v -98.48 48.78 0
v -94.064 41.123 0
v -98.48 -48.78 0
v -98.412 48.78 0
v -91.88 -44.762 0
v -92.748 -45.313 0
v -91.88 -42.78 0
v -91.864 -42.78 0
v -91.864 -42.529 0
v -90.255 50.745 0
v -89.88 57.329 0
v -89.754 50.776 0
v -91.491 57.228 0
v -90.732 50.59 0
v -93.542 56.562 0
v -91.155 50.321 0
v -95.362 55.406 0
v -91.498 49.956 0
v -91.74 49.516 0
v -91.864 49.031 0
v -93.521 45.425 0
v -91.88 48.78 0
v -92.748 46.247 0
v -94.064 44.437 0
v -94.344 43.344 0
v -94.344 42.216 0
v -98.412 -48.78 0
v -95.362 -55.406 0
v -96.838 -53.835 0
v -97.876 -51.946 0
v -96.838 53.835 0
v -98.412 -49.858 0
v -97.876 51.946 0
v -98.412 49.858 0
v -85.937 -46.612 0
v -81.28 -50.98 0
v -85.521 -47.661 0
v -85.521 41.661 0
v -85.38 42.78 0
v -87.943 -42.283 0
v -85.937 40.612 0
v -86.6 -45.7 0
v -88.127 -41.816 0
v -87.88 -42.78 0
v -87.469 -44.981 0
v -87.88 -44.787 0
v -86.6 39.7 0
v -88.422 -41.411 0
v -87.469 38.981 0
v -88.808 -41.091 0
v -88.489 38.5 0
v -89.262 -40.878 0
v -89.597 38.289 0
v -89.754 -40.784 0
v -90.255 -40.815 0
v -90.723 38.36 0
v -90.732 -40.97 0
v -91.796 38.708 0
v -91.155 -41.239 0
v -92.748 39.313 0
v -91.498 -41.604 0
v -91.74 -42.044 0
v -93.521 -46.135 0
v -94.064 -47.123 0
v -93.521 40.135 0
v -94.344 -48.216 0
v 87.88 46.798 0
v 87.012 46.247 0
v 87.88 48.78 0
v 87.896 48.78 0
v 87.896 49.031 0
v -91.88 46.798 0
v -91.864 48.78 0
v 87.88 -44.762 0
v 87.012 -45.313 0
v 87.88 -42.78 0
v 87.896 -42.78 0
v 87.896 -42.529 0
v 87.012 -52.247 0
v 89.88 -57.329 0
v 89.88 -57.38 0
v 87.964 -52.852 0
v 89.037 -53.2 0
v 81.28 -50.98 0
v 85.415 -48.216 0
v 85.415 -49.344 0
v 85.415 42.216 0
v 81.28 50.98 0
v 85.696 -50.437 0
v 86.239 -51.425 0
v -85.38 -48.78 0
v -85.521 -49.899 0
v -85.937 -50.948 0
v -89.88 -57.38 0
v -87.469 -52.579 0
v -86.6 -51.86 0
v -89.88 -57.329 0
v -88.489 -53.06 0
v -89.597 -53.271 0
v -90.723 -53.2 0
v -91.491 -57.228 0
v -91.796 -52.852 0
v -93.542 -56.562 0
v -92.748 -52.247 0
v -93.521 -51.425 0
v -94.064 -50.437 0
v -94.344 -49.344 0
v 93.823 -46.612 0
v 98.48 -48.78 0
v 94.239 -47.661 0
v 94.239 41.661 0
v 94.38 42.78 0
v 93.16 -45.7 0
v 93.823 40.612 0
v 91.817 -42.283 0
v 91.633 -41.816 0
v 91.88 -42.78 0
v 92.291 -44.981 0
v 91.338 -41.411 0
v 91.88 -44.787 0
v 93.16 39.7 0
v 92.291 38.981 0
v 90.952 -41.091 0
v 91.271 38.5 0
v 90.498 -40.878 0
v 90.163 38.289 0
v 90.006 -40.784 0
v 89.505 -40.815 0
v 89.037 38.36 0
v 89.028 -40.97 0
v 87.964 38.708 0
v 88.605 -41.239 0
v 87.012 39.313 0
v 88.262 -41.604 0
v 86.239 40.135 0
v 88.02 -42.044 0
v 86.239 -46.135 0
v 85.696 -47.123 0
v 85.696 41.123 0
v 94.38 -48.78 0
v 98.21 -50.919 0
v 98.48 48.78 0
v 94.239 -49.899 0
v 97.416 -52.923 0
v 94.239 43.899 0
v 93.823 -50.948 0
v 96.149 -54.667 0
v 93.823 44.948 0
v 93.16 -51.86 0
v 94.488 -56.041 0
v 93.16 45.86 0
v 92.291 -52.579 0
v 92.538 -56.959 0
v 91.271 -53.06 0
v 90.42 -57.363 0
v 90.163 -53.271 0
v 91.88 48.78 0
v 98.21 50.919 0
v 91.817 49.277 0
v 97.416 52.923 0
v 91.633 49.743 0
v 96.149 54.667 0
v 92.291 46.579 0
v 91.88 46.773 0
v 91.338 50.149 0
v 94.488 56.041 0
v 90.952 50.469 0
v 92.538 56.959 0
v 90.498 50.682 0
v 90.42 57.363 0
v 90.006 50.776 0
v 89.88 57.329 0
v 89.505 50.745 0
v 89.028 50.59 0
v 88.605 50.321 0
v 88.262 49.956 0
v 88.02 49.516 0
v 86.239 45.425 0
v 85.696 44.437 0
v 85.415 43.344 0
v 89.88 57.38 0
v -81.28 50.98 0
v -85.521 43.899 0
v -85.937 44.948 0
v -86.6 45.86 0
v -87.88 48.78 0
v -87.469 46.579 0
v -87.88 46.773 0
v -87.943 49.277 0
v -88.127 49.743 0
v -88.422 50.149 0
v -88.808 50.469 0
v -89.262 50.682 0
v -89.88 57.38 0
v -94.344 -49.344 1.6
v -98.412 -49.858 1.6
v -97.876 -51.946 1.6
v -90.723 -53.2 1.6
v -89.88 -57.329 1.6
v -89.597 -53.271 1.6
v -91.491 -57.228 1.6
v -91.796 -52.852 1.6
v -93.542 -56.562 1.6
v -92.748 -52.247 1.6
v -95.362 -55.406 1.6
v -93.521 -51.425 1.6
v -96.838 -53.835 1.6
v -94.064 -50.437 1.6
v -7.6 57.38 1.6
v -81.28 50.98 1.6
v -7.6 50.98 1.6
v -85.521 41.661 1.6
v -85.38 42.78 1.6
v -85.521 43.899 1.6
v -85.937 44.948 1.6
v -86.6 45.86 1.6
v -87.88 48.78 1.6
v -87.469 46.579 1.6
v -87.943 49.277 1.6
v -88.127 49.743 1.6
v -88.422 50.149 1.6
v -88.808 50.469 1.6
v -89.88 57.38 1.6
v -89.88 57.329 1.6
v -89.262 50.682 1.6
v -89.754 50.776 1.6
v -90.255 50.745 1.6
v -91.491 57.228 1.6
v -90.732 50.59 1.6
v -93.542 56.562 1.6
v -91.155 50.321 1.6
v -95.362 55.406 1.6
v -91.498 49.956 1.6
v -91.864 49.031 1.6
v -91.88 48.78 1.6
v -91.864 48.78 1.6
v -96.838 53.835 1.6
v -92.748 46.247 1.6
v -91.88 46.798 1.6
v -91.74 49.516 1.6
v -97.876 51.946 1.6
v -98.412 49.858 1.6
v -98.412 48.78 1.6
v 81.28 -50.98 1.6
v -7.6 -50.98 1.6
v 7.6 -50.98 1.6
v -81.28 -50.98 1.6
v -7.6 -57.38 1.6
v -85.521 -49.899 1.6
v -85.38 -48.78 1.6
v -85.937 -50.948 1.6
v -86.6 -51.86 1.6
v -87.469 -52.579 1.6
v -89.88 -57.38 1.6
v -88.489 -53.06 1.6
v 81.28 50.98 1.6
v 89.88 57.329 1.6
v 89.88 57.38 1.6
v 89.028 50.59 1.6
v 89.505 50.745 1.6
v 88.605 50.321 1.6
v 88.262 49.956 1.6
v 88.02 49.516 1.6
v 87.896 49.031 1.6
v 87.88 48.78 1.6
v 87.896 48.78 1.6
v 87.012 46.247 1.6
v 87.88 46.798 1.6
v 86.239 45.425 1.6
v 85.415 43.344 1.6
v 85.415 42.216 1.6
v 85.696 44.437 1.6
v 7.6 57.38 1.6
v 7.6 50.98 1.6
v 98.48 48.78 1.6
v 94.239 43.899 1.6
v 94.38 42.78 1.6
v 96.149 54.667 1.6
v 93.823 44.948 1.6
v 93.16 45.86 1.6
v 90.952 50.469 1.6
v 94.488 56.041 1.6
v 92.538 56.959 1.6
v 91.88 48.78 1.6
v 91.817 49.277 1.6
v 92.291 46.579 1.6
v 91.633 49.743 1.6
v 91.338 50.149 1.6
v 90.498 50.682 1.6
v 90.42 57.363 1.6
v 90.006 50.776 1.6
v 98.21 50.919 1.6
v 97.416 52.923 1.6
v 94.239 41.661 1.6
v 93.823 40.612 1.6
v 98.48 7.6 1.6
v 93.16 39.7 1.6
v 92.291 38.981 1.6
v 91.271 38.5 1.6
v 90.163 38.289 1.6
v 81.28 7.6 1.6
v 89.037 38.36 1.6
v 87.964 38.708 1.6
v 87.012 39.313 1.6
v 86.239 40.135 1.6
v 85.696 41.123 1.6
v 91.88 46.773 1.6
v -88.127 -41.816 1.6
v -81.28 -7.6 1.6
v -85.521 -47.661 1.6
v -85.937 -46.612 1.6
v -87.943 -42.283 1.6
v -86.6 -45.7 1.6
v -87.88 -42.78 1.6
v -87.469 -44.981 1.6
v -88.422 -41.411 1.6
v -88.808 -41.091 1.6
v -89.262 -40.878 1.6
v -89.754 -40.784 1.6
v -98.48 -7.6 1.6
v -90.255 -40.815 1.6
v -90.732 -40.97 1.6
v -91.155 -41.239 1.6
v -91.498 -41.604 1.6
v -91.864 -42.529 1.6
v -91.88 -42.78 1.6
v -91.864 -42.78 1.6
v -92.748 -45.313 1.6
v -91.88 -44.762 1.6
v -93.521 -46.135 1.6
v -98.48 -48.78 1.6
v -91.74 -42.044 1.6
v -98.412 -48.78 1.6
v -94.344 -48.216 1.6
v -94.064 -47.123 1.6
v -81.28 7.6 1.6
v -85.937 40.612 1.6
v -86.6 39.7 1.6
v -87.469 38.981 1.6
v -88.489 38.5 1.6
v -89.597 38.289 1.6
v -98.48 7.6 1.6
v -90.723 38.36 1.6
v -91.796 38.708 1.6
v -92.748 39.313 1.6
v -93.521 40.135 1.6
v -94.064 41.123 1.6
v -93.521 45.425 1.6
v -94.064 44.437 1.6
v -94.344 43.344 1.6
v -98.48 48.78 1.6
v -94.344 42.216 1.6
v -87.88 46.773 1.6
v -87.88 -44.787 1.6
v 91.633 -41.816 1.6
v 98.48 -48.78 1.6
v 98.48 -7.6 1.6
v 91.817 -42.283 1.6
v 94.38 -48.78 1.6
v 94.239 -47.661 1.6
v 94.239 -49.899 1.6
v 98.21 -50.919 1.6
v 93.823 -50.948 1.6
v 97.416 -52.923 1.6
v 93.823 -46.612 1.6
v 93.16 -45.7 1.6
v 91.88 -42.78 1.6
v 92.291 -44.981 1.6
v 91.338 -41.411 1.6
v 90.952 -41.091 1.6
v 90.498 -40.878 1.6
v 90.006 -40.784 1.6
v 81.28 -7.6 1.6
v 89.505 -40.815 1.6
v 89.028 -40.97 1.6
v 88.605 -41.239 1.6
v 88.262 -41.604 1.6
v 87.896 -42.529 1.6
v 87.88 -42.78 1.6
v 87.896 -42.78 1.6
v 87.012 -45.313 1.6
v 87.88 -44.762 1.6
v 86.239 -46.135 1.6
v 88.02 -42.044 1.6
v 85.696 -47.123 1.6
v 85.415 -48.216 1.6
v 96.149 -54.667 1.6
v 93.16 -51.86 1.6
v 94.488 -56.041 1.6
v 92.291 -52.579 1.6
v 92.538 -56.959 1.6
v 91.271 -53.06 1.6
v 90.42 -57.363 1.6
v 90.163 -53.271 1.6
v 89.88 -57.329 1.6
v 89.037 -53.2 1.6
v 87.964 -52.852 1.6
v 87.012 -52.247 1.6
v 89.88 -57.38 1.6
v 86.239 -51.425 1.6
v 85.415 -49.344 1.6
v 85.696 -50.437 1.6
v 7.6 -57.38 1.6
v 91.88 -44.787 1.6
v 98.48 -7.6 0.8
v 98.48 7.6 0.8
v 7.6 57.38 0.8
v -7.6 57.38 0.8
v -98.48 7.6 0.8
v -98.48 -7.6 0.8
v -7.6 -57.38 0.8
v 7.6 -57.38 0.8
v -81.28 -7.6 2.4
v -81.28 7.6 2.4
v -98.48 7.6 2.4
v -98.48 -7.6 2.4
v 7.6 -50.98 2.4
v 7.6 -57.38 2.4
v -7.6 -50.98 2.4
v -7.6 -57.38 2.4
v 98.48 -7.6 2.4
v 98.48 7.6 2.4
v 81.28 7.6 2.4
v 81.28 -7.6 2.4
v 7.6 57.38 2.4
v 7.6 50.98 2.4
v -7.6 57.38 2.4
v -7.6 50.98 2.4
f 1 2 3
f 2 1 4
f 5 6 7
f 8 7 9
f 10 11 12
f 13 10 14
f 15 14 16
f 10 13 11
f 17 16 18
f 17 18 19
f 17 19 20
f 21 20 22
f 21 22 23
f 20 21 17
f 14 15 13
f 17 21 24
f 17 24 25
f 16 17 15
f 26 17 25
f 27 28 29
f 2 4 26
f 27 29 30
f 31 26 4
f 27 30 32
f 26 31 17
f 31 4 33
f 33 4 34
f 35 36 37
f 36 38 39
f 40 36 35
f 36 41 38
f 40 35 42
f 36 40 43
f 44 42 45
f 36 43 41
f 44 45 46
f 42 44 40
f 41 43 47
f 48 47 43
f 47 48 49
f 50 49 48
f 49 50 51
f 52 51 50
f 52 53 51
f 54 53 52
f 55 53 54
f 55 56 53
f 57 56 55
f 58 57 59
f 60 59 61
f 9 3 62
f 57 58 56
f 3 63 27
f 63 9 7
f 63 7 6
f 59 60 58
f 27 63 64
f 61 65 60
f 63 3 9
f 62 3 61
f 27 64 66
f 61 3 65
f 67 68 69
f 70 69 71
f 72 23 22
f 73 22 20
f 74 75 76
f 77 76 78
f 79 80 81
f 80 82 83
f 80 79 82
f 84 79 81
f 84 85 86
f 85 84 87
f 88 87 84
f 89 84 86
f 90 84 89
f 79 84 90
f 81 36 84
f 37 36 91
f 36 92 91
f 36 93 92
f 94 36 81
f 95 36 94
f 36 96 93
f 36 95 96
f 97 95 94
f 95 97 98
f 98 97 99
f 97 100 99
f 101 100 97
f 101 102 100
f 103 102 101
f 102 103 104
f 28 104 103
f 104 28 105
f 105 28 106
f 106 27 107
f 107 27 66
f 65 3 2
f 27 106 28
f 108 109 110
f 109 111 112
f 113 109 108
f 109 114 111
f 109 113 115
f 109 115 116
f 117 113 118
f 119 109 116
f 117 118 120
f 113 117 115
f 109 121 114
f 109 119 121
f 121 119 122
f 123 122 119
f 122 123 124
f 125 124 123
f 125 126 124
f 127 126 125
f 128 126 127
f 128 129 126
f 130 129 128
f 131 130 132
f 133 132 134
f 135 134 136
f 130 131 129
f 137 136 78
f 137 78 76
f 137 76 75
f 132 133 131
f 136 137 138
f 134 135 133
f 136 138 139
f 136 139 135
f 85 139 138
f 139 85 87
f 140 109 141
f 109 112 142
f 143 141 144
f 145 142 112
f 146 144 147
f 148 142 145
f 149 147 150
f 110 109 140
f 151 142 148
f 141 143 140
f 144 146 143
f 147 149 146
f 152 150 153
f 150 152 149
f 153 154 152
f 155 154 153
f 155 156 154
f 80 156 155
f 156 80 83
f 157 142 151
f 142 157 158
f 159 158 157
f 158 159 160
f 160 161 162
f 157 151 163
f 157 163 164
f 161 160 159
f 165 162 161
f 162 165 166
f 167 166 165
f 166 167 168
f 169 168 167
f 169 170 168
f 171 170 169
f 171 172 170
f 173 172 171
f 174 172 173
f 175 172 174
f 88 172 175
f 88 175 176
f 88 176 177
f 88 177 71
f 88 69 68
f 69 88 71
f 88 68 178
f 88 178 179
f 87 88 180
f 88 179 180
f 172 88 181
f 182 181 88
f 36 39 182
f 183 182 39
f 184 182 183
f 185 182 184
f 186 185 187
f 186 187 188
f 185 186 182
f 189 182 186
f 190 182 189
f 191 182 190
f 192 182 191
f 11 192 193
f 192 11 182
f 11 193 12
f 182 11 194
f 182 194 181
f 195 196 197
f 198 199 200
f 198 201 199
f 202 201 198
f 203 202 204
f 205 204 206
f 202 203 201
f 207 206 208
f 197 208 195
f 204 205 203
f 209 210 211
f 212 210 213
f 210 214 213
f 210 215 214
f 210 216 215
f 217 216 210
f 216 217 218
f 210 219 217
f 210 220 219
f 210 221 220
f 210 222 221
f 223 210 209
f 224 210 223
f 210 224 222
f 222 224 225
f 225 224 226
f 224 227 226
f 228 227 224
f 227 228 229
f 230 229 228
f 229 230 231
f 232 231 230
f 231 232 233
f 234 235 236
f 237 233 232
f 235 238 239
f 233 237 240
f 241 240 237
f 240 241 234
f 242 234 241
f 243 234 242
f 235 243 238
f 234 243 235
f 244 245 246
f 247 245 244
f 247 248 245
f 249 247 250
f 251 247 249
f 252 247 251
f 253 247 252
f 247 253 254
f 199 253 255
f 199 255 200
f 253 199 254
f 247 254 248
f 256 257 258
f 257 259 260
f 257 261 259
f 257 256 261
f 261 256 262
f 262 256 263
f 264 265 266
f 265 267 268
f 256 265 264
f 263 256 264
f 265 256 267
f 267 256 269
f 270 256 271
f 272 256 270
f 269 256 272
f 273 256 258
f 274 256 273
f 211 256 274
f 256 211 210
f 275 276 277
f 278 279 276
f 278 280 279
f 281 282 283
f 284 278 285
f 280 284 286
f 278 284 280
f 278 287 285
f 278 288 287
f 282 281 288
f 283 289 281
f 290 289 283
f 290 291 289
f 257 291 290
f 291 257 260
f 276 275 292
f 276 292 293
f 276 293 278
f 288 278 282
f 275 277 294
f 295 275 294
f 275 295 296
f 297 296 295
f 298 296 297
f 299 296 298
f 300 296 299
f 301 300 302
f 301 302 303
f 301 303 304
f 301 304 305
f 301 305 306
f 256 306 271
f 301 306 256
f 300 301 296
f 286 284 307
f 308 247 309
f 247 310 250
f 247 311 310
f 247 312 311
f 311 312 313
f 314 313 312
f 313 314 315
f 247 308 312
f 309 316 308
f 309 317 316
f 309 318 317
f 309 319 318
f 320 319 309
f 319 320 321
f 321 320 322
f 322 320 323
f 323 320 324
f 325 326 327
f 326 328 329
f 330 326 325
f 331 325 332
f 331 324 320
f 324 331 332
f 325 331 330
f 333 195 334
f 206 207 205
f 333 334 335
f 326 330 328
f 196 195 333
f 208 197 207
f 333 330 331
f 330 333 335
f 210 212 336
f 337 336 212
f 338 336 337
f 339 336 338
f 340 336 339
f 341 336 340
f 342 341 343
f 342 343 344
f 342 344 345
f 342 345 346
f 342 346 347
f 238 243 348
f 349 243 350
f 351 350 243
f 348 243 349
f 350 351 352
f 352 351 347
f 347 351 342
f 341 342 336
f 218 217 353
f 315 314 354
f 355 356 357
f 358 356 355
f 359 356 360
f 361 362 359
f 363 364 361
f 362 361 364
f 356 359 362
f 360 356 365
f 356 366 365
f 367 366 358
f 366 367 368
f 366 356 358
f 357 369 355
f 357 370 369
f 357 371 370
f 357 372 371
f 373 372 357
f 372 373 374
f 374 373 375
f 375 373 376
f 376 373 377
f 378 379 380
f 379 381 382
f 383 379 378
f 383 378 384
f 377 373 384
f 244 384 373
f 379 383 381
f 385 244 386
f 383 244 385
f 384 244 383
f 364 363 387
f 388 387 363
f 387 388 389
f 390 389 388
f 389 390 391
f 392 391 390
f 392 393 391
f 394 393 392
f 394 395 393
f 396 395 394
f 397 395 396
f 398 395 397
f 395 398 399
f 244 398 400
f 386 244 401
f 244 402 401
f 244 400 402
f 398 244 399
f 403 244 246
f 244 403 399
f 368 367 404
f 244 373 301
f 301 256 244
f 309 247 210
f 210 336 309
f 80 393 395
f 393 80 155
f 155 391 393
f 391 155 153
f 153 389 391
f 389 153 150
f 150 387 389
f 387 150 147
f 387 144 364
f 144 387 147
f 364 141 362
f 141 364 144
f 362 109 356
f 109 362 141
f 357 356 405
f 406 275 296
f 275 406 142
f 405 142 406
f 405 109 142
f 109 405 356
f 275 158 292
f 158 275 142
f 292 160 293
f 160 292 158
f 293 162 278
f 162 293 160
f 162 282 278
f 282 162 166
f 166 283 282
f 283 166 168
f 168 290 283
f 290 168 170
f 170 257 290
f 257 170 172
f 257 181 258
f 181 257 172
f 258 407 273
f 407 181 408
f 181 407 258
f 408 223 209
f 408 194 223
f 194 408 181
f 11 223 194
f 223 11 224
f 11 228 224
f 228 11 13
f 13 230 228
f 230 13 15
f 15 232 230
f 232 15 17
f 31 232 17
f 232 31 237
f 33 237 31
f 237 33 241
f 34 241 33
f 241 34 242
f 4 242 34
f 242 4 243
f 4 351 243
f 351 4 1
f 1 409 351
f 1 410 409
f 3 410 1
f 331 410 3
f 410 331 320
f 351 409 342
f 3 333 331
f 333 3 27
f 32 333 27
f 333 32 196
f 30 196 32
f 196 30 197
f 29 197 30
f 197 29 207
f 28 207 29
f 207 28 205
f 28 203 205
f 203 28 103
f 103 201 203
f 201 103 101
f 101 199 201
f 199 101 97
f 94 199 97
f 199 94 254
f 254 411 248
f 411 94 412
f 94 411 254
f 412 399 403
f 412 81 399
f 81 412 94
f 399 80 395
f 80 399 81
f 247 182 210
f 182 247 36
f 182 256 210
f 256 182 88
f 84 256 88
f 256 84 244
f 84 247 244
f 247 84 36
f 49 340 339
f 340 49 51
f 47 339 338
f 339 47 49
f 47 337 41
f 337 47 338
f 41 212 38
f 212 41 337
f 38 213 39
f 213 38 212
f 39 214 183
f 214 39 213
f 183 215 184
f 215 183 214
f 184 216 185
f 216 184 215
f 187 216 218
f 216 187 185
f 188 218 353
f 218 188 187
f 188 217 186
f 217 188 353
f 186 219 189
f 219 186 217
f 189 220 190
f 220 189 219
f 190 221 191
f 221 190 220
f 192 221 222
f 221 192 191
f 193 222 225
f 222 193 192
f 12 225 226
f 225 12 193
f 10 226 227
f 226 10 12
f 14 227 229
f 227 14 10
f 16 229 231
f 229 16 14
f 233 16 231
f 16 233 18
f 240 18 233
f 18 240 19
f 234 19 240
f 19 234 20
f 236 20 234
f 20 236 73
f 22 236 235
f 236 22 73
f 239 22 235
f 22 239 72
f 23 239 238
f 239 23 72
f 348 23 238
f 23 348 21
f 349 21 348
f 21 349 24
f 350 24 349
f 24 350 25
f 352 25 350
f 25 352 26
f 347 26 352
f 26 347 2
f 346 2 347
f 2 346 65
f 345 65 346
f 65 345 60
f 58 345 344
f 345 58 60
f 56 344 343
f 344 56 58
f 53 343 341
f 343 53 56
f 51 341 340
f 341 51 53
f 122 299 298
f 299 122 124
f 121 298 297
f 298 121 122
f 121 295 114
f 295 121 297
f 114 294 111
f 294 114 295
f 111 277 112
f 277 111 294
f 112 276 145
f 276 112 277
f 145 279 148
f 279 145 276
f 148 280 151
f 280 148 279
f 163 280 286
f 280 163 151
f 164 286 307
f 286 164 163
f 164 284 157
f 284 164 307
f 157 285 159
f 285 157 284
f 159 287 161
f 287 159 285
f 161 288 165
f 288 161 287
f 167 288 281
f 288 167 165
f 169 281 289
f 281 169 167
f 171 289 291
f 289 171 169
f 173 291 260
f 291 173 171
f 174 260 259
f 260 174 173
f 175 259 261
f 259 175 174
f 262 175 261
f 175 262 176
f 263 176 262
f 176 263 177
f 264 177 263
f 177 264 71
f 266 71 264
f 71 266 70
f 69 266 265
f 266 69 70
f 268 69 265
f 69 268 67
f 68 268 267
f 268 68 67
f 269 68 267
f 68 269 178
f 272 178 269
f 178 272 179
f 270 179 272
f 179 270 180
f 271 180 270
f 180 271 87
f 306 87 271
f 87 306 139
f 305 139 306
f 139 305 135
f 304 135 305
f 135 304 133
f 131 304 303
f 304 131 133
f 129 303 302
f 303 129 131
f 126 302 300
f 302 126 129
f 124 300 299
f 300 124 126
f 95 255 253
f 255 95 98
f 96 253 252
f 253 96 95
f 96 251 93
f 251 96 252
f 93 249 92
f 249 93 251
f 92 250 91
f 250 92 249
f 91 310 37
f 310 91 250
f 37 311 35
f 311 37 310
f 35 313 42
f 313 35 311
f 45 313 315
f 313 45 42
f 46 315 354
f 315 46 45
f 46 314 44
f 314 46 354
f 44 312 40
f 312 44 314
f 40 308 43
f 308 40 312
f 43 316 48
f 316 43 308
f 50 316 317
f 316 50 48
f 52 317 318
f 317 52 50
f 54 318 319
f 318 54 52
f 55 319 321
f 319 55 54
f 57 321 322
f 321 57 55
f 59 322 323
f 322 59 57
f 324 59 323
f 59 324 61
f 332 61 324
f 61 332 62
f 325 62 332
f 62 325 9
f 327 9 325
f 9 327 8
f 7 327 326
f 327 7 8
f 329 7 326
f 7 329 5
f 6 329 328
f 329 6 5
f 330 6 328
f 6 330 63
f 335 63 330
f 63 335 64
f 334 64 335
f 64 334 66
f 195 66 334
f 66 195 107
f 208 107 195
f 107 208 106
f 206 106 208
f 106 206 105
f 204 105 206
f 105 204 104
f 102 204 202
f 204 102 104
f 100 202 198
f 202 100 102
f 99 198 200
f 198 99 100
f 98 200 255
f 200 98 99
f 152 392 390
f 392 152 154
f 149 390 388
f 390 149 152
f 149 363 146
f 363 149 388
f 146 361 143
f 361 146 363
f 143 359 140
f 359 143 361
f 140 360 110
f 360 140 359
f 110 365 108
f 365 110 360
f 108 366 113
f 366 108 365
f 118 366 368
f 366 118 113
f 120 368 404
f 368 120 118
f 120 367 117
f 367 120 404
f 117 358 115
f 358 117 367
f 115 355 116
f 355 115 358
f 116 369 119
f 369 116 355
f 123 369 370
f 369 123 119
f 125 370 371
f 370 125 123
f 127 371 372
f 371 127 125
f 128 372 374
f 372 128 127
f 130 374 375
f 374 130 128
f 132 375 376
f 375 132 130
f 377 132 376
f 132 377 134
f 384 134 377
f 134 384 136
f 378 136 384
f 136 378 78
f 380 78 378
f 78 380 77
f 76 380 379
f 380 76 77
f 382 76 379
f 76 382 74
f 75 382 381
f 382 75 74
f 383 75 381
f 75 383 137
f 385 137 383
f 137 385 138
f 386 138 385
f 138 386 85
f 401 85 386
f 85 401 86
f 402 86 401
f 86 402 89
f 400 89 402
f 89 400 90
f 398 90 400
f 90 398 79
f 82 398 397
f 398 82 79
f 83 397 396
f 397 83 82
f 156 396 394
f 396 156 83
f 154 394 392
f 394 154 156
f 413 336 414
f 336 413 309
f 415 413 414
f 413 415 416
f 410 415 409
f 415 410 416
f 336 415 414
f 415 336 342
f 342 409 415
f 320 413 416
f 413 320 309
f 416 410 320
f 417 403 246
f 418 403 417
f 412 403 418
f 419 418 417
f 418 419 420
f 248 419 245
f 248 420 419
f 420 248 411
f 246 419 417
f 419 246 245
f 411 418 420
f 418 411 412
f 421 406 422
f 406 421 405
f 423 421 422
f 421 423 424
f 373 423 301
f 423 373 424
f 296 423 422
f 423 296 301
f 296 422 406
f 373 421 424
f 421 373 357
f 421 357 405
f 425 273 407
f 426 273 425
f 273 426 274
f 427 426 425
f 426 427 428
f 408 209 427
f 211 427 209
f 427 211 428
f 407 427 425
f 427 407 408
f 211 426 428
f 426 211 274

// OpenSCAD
// file: RPiModules.scad
//Version 8
include <RPiDims.scad>;

$fn=25;
//returns a vector of the center of the circle at each corner 
//of a rounded square in the x-y plane
function corner_vectors(width, breadth, radius = 0) = 
    [
        [radius-width/2,radius-breadth/2,0],
        [width/2-radius,radius-breadth/2,0],
        [radius-width/2,breadth/2-radius,0],
        [width/2-radius,breadth/2-radius,0]];

module rounded_square(width,breadth,radius) {
    union() {
        square(size=[width-2*radius,breadth],center=true);
        square(size=[width,breadth-2*radius],center=true);
        
        for(cv = corner_vectors(width,breadth,radius)) {
            translate(v=cv) {
                circle(r=radius);
            }
        }
    }
}

module rounded_box_sides(width,breadth,radius,height,thickness) {
    linear_extrude(height=height) {
        difference() {
            rounded_square(width,breadth,radius);
            rounded_square(width-2*thickness,breadth-2*thickness,radius-thickness);
        }
    }
}

module key_hole(d1,d2,dist) {
    circle(d=d1);
    translate(v=[0,-1*dist,0]) {
        circle(d=d2);
    }
    translate(v=[0,-0.5*dist,0]) {
        square(size=[d1,dist], center=true);
    }
}

module rounded_square_triag_ring(width,breadth,radius,height,thickness) {
    difference() {
        rounded_box_sides(width,breadth,radius,height,thickness);
        linear_extrude(height=height,scale=[1-2*thickness/width,1-2*thickness/breadth]) {
            rounded_square(width,breadth,radius);
        }
    }
}

module rpi_wall_mount(remove_center_square = true, print_holes = true) {

    //Wall mount plates
    difference() {
        linear_extrude(height=thickness) {
            difference() {
                rounded_square(width,breadth,corner_radius+thickness);
                if (remove_center_square) {
                    square(size=[width-2*mount_plate_width,breadth-8*thickness],center=true);
                }
            }
        }
        if (print_holes) {
            translate(v=[0,hdist/2,0]) {
                linear_extrude(height=thickness) {
                    for (cv = corner_vectors(width,breadth-hdist,corner_radius+thickness)) {
                        translate(v=cv) {
                            key_hole(hd1,hd2,hdist);
                        }
                    }
                }
            }
        }
    }

}

module rpi_case(print_holes = true)
{
    difference() {
        //Rounded sides
        union() {
            rounded_box_sides(width,breadth,corner_radius+thickness,height,thickness);
            for (i=[-1,1]) {
                translate([i*(width-mount_plate_width)/2,0,cable_hole_height/2+thickness]) {
                    //Cable hole boxes (left/right)
                    cube(size=[mount_plate_width,cable_hole_width+2*thickness,cable_hole_height+2*thickness],center=true);
                    for (j=[-1,1]) {
                        translate([0,j*(breadth-1.5*mount_plate_width)/2,-cable_hole_height/2-thickness]) {
                            rounded_box_sides(mount_plate_width,1.5*mount_plate_width,corner_radius+thickness,cable_hole_height+2*thickness,thickness);
                        }
                    }
                }
                translate([0,i*(breadth-4*thickness)/2,cable_hole_height/2+thickness]) {
                    //Cable hole boxes (top/bottom)
                    cube(size=[cable_hole_width+2*thickness,4*thickness,cable_hole_height+2*thickness],center=true);
                }
            }
        }
        //Ventilation grille
        translate (v=[-0.5*grille_dist*(grille_count-1),thickness-breadth/2,0.15*height]) {
            rotate(a = 90,v=[1,0,0]) {
                for (i = [0:grille_count-1]) {
                    translate (v=[i*grille_dist,4*grille_width,-breadth]) {
                        //Ventilation grille
                        linear_extrude(height=breadth+2*thickness, twist=0, center=false) {
                            union() {
                                circle(d=grille_width);
                                translate(v=[-0.5*grille_width,0,0]) {
                                    square(size=[grille_width,0.4*height]);
                                }
                                translate(v=[0,0.4*height,0]) {
                                    circle(d=grille_width);
                                }
                            }
                        }
                    }
                }
            }
        }
        //Cable holes
        for (i=[-1,1]) {
            translate([i*(width-mount_plate_width)/2,0,cable_hole_height/2+thickness]) {
                cube(size=[mount_plate_width-thickness,cable_hole_width,cable_hole_height], center=true);
            }
            translate([0,i*(breadth-4*thickness)/2,cable_hole_height/2+thickness]) {
                //Cable hole boxes (top/bottom)
                cube(size=[cable_hole_width,3*thickness,cable_hole_height],center=true);
            }
        }
    }

    rpi_wall_mount();

    //Screen mount support rims
    translate(v=[0,0,height-screen_thickness_at_mounts]) {
        rounded_box_sides(width-2*thickness,breadth-2*thickness,corner_radius,screen_thickness_at_mounts-screen_edge_thickness,2*thickness);
        translate(v=[0,0,-2*thickness]) {
            difference() {
                rounded_square_triag_ring(width-2*thickness,breadth-2*thickness,corner_radius,2*thickness,2*thickness);
                for (i=[-1,1]) {
                    translate(v=[i*screen_mount_dist_x*0.5+screen_mount_offset_x,0,thickness]) {
                        cube([7*screen_mount_hole_diameter,breadth-2*thickness,2*thickness], true);
                    }
                }
            }
        }
    }
}

module rpi_screen_mount_plates() {
    //Screen mount plates
    rotate(90) {
        for (i=[-1,1]) {
            translate([i*4*screen_mount_hole_diameter,0,thickness]) {
                difference() {
                    cube([5*screen_mount_hole_diameter,breadth-2*thickness,2*thickness], true);
                    for (i=[-1,1]) {
                        translate([0,i*screen_mount_dist_y/2+screen_mount_offset_y,0]) {
                            for (j=[-1,1]) {
                                translate([0,j*screen_mount_hole_diameter/2,0]) {
                                    cylinder(d=screen_mount_hole_diameter,h=2*thickness,center=true);
                                }
                            }
                            cube([screen_mount_hole_diameter,screen_mount_hole_diameter,2*thickness],true);
                        }
                    }
                }
            }
        }
    }
}

module rpt_mount_plate() {
    linear_extrude(height=thickness) {
        difference() {
            square(size=[width-2*mount_plate_width-2*lth,breadth-8*thickness-2*lth],center=true);
            for (i=[-1,1]) {
                translate(v=[i*75/2,breadth/2-40-lth]) {
                    key_hole(hd1,hd2,hdist);
                }
            }

        }
    }
    for (i=[-1,1]) {
        translate(v=[i*width/4,(breadth-8*thickness)/2-thickness-lth,thickness]) {
            intersection() {
                linear_extrude(height=thickness, scale=2) {
                    square([width/4,2*thickness], center=true);
                }
                translate([0,thickness,0]) {
                    linear_extrude(height=thickness) {
                        square([width/4,2*thickness], center=true);
                    }
                }
            }
            translate([0,thickness,thickness]) {
                linear_extrude(height=thickness) {
                    square([width/4,2*thickness], center=true);
                }
            }
                linear_extrude(height=2*thickness) {
                    square([width/4,2*thickness], center=true);
                }

        }
    }
}
// file: RPiDims.scad
thickness=1.6;                                        //Thickness of case walls
lth=0.2;                                              //Layer thickness
width=192.96+2.5*thickness;                           //Width of case (x dim)
breadth=110.76+2.5*thickness;                         //Breadth of case (y dim)
height=55;                                            //Height of case (z dim)
corner_radius=7;                                      //Radius of screen corners
hd1=4;                                                //Mount key hole diameter 1
hd2=9;                                                //Mount key hole diameter 2
hdist=6;                                              //Mount key hole distance
mount_plate_width=2*(corner_radius+thickness);        //Mount plate width
screen_edge_thickness=0.8;                            //Screen edge thickness 
screen_thickness_at_mounts=8.5;                       //Screen thickness at mounts
screen_mount_hole_diameter=3.5;                       //Screen mount hole diameter
screen_mount_plate_width=3*screen_mount_hole_diameter;//Screen mount plate width
screen_mount_dist_x=125.46;                           //Distance between screen mount holes in x direction
screen_mount_dist_y=65.8;                             //Distance between screen mount holes in y direction
screen_mount_offset_x=1.05;                           //Screen mount holes offset from center in x direction
screen_mount_offset_y=0.5;                            //Screen mount holes offset from center in y direction
grille_width=1.5*thickness;                           //Width of each ventilation grille
grille_dist=6*thickness;                              //Distance between ventilation grilles
grille_count=12;                                      //Number of ventilation grilles
cable_hole_height = 10;                               //
cable_hole_width=12;                                  //
// main file
include <RPiDims.scad>
use <RPiModules.scad>

rpi_wall_mount(true);

for (i=[-1,1]) {
    translate([i*(width-mount_plate_width)/2,0,thickness]) {
        //Cable hole boxes (left/right)
        cube(size=[mount_plate_width,cable_hole_width+2*thickness,thickness],center=true);
    }
    translate([0,i*(breadth-4*thickness)/2,thickness]) {
        //Cable hole boxes (top/bottom)
        cube(size=[cable_hole_width+2*thickness,4*thickness,thickness],center=true);
    }
}
